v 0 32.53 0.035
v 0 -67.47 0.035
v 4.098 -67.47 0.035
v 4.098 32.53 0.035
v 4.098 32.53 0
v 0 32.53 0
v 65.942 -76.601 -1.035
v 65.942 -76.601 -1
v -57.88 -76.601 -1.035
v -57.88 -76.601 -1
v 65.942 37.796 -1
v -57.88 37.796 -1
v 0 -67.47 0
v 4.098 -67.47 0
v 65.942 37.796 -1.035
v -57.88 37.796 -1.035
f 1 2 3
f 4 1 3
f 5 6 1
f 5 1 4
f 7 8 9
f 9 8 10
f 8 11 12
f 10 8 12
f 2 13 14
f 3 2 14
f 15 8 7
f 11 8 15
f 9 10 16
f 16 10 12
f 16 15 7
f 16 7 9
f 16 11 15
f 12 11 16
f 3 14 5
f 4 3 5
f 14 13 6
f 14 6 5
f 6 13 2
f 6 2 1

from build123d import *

# Parameters (mm, degrees)
SKETCH_2_W      = 4.098
SKETCH_2_H      = 100
EXTRUDE_1_DEPTH = 0.035
SKETCH_6_W      = 123.821295425
SKETCH_6_H      = 114.396561675
EXTRUDE_4_DEPTH = 0.035


with BuildPart() as part:
    # Эскиз2 → Бобышка-Вытянуть1 (new body)
    with BuildSketch(Plane.XY):
        with Locations((2.049, -17.469779106)):
            Rectangle(SKETCH_2_W, SKETCH_2_H)
    extrude(amount=EXTRUDE_1_DEPTH)


with BuildPart() as body_2:
    # Эскиз6 → Бобышка-Вытянуть4 (new body)
    with BuildSketch(Plane(origin=(0, 0, -1), x_dir=(-1, 0, 0), z_dir=(0, 0, -1))):
        with Locations((-4.031023099, -19.402482236)):
            Rectangle(SKETCH_6_W, SKETCH_6_H)
    extrude(amount=EXTRUDE_4_DEPTH)


solid = Compound([part.part, body_2.part])
